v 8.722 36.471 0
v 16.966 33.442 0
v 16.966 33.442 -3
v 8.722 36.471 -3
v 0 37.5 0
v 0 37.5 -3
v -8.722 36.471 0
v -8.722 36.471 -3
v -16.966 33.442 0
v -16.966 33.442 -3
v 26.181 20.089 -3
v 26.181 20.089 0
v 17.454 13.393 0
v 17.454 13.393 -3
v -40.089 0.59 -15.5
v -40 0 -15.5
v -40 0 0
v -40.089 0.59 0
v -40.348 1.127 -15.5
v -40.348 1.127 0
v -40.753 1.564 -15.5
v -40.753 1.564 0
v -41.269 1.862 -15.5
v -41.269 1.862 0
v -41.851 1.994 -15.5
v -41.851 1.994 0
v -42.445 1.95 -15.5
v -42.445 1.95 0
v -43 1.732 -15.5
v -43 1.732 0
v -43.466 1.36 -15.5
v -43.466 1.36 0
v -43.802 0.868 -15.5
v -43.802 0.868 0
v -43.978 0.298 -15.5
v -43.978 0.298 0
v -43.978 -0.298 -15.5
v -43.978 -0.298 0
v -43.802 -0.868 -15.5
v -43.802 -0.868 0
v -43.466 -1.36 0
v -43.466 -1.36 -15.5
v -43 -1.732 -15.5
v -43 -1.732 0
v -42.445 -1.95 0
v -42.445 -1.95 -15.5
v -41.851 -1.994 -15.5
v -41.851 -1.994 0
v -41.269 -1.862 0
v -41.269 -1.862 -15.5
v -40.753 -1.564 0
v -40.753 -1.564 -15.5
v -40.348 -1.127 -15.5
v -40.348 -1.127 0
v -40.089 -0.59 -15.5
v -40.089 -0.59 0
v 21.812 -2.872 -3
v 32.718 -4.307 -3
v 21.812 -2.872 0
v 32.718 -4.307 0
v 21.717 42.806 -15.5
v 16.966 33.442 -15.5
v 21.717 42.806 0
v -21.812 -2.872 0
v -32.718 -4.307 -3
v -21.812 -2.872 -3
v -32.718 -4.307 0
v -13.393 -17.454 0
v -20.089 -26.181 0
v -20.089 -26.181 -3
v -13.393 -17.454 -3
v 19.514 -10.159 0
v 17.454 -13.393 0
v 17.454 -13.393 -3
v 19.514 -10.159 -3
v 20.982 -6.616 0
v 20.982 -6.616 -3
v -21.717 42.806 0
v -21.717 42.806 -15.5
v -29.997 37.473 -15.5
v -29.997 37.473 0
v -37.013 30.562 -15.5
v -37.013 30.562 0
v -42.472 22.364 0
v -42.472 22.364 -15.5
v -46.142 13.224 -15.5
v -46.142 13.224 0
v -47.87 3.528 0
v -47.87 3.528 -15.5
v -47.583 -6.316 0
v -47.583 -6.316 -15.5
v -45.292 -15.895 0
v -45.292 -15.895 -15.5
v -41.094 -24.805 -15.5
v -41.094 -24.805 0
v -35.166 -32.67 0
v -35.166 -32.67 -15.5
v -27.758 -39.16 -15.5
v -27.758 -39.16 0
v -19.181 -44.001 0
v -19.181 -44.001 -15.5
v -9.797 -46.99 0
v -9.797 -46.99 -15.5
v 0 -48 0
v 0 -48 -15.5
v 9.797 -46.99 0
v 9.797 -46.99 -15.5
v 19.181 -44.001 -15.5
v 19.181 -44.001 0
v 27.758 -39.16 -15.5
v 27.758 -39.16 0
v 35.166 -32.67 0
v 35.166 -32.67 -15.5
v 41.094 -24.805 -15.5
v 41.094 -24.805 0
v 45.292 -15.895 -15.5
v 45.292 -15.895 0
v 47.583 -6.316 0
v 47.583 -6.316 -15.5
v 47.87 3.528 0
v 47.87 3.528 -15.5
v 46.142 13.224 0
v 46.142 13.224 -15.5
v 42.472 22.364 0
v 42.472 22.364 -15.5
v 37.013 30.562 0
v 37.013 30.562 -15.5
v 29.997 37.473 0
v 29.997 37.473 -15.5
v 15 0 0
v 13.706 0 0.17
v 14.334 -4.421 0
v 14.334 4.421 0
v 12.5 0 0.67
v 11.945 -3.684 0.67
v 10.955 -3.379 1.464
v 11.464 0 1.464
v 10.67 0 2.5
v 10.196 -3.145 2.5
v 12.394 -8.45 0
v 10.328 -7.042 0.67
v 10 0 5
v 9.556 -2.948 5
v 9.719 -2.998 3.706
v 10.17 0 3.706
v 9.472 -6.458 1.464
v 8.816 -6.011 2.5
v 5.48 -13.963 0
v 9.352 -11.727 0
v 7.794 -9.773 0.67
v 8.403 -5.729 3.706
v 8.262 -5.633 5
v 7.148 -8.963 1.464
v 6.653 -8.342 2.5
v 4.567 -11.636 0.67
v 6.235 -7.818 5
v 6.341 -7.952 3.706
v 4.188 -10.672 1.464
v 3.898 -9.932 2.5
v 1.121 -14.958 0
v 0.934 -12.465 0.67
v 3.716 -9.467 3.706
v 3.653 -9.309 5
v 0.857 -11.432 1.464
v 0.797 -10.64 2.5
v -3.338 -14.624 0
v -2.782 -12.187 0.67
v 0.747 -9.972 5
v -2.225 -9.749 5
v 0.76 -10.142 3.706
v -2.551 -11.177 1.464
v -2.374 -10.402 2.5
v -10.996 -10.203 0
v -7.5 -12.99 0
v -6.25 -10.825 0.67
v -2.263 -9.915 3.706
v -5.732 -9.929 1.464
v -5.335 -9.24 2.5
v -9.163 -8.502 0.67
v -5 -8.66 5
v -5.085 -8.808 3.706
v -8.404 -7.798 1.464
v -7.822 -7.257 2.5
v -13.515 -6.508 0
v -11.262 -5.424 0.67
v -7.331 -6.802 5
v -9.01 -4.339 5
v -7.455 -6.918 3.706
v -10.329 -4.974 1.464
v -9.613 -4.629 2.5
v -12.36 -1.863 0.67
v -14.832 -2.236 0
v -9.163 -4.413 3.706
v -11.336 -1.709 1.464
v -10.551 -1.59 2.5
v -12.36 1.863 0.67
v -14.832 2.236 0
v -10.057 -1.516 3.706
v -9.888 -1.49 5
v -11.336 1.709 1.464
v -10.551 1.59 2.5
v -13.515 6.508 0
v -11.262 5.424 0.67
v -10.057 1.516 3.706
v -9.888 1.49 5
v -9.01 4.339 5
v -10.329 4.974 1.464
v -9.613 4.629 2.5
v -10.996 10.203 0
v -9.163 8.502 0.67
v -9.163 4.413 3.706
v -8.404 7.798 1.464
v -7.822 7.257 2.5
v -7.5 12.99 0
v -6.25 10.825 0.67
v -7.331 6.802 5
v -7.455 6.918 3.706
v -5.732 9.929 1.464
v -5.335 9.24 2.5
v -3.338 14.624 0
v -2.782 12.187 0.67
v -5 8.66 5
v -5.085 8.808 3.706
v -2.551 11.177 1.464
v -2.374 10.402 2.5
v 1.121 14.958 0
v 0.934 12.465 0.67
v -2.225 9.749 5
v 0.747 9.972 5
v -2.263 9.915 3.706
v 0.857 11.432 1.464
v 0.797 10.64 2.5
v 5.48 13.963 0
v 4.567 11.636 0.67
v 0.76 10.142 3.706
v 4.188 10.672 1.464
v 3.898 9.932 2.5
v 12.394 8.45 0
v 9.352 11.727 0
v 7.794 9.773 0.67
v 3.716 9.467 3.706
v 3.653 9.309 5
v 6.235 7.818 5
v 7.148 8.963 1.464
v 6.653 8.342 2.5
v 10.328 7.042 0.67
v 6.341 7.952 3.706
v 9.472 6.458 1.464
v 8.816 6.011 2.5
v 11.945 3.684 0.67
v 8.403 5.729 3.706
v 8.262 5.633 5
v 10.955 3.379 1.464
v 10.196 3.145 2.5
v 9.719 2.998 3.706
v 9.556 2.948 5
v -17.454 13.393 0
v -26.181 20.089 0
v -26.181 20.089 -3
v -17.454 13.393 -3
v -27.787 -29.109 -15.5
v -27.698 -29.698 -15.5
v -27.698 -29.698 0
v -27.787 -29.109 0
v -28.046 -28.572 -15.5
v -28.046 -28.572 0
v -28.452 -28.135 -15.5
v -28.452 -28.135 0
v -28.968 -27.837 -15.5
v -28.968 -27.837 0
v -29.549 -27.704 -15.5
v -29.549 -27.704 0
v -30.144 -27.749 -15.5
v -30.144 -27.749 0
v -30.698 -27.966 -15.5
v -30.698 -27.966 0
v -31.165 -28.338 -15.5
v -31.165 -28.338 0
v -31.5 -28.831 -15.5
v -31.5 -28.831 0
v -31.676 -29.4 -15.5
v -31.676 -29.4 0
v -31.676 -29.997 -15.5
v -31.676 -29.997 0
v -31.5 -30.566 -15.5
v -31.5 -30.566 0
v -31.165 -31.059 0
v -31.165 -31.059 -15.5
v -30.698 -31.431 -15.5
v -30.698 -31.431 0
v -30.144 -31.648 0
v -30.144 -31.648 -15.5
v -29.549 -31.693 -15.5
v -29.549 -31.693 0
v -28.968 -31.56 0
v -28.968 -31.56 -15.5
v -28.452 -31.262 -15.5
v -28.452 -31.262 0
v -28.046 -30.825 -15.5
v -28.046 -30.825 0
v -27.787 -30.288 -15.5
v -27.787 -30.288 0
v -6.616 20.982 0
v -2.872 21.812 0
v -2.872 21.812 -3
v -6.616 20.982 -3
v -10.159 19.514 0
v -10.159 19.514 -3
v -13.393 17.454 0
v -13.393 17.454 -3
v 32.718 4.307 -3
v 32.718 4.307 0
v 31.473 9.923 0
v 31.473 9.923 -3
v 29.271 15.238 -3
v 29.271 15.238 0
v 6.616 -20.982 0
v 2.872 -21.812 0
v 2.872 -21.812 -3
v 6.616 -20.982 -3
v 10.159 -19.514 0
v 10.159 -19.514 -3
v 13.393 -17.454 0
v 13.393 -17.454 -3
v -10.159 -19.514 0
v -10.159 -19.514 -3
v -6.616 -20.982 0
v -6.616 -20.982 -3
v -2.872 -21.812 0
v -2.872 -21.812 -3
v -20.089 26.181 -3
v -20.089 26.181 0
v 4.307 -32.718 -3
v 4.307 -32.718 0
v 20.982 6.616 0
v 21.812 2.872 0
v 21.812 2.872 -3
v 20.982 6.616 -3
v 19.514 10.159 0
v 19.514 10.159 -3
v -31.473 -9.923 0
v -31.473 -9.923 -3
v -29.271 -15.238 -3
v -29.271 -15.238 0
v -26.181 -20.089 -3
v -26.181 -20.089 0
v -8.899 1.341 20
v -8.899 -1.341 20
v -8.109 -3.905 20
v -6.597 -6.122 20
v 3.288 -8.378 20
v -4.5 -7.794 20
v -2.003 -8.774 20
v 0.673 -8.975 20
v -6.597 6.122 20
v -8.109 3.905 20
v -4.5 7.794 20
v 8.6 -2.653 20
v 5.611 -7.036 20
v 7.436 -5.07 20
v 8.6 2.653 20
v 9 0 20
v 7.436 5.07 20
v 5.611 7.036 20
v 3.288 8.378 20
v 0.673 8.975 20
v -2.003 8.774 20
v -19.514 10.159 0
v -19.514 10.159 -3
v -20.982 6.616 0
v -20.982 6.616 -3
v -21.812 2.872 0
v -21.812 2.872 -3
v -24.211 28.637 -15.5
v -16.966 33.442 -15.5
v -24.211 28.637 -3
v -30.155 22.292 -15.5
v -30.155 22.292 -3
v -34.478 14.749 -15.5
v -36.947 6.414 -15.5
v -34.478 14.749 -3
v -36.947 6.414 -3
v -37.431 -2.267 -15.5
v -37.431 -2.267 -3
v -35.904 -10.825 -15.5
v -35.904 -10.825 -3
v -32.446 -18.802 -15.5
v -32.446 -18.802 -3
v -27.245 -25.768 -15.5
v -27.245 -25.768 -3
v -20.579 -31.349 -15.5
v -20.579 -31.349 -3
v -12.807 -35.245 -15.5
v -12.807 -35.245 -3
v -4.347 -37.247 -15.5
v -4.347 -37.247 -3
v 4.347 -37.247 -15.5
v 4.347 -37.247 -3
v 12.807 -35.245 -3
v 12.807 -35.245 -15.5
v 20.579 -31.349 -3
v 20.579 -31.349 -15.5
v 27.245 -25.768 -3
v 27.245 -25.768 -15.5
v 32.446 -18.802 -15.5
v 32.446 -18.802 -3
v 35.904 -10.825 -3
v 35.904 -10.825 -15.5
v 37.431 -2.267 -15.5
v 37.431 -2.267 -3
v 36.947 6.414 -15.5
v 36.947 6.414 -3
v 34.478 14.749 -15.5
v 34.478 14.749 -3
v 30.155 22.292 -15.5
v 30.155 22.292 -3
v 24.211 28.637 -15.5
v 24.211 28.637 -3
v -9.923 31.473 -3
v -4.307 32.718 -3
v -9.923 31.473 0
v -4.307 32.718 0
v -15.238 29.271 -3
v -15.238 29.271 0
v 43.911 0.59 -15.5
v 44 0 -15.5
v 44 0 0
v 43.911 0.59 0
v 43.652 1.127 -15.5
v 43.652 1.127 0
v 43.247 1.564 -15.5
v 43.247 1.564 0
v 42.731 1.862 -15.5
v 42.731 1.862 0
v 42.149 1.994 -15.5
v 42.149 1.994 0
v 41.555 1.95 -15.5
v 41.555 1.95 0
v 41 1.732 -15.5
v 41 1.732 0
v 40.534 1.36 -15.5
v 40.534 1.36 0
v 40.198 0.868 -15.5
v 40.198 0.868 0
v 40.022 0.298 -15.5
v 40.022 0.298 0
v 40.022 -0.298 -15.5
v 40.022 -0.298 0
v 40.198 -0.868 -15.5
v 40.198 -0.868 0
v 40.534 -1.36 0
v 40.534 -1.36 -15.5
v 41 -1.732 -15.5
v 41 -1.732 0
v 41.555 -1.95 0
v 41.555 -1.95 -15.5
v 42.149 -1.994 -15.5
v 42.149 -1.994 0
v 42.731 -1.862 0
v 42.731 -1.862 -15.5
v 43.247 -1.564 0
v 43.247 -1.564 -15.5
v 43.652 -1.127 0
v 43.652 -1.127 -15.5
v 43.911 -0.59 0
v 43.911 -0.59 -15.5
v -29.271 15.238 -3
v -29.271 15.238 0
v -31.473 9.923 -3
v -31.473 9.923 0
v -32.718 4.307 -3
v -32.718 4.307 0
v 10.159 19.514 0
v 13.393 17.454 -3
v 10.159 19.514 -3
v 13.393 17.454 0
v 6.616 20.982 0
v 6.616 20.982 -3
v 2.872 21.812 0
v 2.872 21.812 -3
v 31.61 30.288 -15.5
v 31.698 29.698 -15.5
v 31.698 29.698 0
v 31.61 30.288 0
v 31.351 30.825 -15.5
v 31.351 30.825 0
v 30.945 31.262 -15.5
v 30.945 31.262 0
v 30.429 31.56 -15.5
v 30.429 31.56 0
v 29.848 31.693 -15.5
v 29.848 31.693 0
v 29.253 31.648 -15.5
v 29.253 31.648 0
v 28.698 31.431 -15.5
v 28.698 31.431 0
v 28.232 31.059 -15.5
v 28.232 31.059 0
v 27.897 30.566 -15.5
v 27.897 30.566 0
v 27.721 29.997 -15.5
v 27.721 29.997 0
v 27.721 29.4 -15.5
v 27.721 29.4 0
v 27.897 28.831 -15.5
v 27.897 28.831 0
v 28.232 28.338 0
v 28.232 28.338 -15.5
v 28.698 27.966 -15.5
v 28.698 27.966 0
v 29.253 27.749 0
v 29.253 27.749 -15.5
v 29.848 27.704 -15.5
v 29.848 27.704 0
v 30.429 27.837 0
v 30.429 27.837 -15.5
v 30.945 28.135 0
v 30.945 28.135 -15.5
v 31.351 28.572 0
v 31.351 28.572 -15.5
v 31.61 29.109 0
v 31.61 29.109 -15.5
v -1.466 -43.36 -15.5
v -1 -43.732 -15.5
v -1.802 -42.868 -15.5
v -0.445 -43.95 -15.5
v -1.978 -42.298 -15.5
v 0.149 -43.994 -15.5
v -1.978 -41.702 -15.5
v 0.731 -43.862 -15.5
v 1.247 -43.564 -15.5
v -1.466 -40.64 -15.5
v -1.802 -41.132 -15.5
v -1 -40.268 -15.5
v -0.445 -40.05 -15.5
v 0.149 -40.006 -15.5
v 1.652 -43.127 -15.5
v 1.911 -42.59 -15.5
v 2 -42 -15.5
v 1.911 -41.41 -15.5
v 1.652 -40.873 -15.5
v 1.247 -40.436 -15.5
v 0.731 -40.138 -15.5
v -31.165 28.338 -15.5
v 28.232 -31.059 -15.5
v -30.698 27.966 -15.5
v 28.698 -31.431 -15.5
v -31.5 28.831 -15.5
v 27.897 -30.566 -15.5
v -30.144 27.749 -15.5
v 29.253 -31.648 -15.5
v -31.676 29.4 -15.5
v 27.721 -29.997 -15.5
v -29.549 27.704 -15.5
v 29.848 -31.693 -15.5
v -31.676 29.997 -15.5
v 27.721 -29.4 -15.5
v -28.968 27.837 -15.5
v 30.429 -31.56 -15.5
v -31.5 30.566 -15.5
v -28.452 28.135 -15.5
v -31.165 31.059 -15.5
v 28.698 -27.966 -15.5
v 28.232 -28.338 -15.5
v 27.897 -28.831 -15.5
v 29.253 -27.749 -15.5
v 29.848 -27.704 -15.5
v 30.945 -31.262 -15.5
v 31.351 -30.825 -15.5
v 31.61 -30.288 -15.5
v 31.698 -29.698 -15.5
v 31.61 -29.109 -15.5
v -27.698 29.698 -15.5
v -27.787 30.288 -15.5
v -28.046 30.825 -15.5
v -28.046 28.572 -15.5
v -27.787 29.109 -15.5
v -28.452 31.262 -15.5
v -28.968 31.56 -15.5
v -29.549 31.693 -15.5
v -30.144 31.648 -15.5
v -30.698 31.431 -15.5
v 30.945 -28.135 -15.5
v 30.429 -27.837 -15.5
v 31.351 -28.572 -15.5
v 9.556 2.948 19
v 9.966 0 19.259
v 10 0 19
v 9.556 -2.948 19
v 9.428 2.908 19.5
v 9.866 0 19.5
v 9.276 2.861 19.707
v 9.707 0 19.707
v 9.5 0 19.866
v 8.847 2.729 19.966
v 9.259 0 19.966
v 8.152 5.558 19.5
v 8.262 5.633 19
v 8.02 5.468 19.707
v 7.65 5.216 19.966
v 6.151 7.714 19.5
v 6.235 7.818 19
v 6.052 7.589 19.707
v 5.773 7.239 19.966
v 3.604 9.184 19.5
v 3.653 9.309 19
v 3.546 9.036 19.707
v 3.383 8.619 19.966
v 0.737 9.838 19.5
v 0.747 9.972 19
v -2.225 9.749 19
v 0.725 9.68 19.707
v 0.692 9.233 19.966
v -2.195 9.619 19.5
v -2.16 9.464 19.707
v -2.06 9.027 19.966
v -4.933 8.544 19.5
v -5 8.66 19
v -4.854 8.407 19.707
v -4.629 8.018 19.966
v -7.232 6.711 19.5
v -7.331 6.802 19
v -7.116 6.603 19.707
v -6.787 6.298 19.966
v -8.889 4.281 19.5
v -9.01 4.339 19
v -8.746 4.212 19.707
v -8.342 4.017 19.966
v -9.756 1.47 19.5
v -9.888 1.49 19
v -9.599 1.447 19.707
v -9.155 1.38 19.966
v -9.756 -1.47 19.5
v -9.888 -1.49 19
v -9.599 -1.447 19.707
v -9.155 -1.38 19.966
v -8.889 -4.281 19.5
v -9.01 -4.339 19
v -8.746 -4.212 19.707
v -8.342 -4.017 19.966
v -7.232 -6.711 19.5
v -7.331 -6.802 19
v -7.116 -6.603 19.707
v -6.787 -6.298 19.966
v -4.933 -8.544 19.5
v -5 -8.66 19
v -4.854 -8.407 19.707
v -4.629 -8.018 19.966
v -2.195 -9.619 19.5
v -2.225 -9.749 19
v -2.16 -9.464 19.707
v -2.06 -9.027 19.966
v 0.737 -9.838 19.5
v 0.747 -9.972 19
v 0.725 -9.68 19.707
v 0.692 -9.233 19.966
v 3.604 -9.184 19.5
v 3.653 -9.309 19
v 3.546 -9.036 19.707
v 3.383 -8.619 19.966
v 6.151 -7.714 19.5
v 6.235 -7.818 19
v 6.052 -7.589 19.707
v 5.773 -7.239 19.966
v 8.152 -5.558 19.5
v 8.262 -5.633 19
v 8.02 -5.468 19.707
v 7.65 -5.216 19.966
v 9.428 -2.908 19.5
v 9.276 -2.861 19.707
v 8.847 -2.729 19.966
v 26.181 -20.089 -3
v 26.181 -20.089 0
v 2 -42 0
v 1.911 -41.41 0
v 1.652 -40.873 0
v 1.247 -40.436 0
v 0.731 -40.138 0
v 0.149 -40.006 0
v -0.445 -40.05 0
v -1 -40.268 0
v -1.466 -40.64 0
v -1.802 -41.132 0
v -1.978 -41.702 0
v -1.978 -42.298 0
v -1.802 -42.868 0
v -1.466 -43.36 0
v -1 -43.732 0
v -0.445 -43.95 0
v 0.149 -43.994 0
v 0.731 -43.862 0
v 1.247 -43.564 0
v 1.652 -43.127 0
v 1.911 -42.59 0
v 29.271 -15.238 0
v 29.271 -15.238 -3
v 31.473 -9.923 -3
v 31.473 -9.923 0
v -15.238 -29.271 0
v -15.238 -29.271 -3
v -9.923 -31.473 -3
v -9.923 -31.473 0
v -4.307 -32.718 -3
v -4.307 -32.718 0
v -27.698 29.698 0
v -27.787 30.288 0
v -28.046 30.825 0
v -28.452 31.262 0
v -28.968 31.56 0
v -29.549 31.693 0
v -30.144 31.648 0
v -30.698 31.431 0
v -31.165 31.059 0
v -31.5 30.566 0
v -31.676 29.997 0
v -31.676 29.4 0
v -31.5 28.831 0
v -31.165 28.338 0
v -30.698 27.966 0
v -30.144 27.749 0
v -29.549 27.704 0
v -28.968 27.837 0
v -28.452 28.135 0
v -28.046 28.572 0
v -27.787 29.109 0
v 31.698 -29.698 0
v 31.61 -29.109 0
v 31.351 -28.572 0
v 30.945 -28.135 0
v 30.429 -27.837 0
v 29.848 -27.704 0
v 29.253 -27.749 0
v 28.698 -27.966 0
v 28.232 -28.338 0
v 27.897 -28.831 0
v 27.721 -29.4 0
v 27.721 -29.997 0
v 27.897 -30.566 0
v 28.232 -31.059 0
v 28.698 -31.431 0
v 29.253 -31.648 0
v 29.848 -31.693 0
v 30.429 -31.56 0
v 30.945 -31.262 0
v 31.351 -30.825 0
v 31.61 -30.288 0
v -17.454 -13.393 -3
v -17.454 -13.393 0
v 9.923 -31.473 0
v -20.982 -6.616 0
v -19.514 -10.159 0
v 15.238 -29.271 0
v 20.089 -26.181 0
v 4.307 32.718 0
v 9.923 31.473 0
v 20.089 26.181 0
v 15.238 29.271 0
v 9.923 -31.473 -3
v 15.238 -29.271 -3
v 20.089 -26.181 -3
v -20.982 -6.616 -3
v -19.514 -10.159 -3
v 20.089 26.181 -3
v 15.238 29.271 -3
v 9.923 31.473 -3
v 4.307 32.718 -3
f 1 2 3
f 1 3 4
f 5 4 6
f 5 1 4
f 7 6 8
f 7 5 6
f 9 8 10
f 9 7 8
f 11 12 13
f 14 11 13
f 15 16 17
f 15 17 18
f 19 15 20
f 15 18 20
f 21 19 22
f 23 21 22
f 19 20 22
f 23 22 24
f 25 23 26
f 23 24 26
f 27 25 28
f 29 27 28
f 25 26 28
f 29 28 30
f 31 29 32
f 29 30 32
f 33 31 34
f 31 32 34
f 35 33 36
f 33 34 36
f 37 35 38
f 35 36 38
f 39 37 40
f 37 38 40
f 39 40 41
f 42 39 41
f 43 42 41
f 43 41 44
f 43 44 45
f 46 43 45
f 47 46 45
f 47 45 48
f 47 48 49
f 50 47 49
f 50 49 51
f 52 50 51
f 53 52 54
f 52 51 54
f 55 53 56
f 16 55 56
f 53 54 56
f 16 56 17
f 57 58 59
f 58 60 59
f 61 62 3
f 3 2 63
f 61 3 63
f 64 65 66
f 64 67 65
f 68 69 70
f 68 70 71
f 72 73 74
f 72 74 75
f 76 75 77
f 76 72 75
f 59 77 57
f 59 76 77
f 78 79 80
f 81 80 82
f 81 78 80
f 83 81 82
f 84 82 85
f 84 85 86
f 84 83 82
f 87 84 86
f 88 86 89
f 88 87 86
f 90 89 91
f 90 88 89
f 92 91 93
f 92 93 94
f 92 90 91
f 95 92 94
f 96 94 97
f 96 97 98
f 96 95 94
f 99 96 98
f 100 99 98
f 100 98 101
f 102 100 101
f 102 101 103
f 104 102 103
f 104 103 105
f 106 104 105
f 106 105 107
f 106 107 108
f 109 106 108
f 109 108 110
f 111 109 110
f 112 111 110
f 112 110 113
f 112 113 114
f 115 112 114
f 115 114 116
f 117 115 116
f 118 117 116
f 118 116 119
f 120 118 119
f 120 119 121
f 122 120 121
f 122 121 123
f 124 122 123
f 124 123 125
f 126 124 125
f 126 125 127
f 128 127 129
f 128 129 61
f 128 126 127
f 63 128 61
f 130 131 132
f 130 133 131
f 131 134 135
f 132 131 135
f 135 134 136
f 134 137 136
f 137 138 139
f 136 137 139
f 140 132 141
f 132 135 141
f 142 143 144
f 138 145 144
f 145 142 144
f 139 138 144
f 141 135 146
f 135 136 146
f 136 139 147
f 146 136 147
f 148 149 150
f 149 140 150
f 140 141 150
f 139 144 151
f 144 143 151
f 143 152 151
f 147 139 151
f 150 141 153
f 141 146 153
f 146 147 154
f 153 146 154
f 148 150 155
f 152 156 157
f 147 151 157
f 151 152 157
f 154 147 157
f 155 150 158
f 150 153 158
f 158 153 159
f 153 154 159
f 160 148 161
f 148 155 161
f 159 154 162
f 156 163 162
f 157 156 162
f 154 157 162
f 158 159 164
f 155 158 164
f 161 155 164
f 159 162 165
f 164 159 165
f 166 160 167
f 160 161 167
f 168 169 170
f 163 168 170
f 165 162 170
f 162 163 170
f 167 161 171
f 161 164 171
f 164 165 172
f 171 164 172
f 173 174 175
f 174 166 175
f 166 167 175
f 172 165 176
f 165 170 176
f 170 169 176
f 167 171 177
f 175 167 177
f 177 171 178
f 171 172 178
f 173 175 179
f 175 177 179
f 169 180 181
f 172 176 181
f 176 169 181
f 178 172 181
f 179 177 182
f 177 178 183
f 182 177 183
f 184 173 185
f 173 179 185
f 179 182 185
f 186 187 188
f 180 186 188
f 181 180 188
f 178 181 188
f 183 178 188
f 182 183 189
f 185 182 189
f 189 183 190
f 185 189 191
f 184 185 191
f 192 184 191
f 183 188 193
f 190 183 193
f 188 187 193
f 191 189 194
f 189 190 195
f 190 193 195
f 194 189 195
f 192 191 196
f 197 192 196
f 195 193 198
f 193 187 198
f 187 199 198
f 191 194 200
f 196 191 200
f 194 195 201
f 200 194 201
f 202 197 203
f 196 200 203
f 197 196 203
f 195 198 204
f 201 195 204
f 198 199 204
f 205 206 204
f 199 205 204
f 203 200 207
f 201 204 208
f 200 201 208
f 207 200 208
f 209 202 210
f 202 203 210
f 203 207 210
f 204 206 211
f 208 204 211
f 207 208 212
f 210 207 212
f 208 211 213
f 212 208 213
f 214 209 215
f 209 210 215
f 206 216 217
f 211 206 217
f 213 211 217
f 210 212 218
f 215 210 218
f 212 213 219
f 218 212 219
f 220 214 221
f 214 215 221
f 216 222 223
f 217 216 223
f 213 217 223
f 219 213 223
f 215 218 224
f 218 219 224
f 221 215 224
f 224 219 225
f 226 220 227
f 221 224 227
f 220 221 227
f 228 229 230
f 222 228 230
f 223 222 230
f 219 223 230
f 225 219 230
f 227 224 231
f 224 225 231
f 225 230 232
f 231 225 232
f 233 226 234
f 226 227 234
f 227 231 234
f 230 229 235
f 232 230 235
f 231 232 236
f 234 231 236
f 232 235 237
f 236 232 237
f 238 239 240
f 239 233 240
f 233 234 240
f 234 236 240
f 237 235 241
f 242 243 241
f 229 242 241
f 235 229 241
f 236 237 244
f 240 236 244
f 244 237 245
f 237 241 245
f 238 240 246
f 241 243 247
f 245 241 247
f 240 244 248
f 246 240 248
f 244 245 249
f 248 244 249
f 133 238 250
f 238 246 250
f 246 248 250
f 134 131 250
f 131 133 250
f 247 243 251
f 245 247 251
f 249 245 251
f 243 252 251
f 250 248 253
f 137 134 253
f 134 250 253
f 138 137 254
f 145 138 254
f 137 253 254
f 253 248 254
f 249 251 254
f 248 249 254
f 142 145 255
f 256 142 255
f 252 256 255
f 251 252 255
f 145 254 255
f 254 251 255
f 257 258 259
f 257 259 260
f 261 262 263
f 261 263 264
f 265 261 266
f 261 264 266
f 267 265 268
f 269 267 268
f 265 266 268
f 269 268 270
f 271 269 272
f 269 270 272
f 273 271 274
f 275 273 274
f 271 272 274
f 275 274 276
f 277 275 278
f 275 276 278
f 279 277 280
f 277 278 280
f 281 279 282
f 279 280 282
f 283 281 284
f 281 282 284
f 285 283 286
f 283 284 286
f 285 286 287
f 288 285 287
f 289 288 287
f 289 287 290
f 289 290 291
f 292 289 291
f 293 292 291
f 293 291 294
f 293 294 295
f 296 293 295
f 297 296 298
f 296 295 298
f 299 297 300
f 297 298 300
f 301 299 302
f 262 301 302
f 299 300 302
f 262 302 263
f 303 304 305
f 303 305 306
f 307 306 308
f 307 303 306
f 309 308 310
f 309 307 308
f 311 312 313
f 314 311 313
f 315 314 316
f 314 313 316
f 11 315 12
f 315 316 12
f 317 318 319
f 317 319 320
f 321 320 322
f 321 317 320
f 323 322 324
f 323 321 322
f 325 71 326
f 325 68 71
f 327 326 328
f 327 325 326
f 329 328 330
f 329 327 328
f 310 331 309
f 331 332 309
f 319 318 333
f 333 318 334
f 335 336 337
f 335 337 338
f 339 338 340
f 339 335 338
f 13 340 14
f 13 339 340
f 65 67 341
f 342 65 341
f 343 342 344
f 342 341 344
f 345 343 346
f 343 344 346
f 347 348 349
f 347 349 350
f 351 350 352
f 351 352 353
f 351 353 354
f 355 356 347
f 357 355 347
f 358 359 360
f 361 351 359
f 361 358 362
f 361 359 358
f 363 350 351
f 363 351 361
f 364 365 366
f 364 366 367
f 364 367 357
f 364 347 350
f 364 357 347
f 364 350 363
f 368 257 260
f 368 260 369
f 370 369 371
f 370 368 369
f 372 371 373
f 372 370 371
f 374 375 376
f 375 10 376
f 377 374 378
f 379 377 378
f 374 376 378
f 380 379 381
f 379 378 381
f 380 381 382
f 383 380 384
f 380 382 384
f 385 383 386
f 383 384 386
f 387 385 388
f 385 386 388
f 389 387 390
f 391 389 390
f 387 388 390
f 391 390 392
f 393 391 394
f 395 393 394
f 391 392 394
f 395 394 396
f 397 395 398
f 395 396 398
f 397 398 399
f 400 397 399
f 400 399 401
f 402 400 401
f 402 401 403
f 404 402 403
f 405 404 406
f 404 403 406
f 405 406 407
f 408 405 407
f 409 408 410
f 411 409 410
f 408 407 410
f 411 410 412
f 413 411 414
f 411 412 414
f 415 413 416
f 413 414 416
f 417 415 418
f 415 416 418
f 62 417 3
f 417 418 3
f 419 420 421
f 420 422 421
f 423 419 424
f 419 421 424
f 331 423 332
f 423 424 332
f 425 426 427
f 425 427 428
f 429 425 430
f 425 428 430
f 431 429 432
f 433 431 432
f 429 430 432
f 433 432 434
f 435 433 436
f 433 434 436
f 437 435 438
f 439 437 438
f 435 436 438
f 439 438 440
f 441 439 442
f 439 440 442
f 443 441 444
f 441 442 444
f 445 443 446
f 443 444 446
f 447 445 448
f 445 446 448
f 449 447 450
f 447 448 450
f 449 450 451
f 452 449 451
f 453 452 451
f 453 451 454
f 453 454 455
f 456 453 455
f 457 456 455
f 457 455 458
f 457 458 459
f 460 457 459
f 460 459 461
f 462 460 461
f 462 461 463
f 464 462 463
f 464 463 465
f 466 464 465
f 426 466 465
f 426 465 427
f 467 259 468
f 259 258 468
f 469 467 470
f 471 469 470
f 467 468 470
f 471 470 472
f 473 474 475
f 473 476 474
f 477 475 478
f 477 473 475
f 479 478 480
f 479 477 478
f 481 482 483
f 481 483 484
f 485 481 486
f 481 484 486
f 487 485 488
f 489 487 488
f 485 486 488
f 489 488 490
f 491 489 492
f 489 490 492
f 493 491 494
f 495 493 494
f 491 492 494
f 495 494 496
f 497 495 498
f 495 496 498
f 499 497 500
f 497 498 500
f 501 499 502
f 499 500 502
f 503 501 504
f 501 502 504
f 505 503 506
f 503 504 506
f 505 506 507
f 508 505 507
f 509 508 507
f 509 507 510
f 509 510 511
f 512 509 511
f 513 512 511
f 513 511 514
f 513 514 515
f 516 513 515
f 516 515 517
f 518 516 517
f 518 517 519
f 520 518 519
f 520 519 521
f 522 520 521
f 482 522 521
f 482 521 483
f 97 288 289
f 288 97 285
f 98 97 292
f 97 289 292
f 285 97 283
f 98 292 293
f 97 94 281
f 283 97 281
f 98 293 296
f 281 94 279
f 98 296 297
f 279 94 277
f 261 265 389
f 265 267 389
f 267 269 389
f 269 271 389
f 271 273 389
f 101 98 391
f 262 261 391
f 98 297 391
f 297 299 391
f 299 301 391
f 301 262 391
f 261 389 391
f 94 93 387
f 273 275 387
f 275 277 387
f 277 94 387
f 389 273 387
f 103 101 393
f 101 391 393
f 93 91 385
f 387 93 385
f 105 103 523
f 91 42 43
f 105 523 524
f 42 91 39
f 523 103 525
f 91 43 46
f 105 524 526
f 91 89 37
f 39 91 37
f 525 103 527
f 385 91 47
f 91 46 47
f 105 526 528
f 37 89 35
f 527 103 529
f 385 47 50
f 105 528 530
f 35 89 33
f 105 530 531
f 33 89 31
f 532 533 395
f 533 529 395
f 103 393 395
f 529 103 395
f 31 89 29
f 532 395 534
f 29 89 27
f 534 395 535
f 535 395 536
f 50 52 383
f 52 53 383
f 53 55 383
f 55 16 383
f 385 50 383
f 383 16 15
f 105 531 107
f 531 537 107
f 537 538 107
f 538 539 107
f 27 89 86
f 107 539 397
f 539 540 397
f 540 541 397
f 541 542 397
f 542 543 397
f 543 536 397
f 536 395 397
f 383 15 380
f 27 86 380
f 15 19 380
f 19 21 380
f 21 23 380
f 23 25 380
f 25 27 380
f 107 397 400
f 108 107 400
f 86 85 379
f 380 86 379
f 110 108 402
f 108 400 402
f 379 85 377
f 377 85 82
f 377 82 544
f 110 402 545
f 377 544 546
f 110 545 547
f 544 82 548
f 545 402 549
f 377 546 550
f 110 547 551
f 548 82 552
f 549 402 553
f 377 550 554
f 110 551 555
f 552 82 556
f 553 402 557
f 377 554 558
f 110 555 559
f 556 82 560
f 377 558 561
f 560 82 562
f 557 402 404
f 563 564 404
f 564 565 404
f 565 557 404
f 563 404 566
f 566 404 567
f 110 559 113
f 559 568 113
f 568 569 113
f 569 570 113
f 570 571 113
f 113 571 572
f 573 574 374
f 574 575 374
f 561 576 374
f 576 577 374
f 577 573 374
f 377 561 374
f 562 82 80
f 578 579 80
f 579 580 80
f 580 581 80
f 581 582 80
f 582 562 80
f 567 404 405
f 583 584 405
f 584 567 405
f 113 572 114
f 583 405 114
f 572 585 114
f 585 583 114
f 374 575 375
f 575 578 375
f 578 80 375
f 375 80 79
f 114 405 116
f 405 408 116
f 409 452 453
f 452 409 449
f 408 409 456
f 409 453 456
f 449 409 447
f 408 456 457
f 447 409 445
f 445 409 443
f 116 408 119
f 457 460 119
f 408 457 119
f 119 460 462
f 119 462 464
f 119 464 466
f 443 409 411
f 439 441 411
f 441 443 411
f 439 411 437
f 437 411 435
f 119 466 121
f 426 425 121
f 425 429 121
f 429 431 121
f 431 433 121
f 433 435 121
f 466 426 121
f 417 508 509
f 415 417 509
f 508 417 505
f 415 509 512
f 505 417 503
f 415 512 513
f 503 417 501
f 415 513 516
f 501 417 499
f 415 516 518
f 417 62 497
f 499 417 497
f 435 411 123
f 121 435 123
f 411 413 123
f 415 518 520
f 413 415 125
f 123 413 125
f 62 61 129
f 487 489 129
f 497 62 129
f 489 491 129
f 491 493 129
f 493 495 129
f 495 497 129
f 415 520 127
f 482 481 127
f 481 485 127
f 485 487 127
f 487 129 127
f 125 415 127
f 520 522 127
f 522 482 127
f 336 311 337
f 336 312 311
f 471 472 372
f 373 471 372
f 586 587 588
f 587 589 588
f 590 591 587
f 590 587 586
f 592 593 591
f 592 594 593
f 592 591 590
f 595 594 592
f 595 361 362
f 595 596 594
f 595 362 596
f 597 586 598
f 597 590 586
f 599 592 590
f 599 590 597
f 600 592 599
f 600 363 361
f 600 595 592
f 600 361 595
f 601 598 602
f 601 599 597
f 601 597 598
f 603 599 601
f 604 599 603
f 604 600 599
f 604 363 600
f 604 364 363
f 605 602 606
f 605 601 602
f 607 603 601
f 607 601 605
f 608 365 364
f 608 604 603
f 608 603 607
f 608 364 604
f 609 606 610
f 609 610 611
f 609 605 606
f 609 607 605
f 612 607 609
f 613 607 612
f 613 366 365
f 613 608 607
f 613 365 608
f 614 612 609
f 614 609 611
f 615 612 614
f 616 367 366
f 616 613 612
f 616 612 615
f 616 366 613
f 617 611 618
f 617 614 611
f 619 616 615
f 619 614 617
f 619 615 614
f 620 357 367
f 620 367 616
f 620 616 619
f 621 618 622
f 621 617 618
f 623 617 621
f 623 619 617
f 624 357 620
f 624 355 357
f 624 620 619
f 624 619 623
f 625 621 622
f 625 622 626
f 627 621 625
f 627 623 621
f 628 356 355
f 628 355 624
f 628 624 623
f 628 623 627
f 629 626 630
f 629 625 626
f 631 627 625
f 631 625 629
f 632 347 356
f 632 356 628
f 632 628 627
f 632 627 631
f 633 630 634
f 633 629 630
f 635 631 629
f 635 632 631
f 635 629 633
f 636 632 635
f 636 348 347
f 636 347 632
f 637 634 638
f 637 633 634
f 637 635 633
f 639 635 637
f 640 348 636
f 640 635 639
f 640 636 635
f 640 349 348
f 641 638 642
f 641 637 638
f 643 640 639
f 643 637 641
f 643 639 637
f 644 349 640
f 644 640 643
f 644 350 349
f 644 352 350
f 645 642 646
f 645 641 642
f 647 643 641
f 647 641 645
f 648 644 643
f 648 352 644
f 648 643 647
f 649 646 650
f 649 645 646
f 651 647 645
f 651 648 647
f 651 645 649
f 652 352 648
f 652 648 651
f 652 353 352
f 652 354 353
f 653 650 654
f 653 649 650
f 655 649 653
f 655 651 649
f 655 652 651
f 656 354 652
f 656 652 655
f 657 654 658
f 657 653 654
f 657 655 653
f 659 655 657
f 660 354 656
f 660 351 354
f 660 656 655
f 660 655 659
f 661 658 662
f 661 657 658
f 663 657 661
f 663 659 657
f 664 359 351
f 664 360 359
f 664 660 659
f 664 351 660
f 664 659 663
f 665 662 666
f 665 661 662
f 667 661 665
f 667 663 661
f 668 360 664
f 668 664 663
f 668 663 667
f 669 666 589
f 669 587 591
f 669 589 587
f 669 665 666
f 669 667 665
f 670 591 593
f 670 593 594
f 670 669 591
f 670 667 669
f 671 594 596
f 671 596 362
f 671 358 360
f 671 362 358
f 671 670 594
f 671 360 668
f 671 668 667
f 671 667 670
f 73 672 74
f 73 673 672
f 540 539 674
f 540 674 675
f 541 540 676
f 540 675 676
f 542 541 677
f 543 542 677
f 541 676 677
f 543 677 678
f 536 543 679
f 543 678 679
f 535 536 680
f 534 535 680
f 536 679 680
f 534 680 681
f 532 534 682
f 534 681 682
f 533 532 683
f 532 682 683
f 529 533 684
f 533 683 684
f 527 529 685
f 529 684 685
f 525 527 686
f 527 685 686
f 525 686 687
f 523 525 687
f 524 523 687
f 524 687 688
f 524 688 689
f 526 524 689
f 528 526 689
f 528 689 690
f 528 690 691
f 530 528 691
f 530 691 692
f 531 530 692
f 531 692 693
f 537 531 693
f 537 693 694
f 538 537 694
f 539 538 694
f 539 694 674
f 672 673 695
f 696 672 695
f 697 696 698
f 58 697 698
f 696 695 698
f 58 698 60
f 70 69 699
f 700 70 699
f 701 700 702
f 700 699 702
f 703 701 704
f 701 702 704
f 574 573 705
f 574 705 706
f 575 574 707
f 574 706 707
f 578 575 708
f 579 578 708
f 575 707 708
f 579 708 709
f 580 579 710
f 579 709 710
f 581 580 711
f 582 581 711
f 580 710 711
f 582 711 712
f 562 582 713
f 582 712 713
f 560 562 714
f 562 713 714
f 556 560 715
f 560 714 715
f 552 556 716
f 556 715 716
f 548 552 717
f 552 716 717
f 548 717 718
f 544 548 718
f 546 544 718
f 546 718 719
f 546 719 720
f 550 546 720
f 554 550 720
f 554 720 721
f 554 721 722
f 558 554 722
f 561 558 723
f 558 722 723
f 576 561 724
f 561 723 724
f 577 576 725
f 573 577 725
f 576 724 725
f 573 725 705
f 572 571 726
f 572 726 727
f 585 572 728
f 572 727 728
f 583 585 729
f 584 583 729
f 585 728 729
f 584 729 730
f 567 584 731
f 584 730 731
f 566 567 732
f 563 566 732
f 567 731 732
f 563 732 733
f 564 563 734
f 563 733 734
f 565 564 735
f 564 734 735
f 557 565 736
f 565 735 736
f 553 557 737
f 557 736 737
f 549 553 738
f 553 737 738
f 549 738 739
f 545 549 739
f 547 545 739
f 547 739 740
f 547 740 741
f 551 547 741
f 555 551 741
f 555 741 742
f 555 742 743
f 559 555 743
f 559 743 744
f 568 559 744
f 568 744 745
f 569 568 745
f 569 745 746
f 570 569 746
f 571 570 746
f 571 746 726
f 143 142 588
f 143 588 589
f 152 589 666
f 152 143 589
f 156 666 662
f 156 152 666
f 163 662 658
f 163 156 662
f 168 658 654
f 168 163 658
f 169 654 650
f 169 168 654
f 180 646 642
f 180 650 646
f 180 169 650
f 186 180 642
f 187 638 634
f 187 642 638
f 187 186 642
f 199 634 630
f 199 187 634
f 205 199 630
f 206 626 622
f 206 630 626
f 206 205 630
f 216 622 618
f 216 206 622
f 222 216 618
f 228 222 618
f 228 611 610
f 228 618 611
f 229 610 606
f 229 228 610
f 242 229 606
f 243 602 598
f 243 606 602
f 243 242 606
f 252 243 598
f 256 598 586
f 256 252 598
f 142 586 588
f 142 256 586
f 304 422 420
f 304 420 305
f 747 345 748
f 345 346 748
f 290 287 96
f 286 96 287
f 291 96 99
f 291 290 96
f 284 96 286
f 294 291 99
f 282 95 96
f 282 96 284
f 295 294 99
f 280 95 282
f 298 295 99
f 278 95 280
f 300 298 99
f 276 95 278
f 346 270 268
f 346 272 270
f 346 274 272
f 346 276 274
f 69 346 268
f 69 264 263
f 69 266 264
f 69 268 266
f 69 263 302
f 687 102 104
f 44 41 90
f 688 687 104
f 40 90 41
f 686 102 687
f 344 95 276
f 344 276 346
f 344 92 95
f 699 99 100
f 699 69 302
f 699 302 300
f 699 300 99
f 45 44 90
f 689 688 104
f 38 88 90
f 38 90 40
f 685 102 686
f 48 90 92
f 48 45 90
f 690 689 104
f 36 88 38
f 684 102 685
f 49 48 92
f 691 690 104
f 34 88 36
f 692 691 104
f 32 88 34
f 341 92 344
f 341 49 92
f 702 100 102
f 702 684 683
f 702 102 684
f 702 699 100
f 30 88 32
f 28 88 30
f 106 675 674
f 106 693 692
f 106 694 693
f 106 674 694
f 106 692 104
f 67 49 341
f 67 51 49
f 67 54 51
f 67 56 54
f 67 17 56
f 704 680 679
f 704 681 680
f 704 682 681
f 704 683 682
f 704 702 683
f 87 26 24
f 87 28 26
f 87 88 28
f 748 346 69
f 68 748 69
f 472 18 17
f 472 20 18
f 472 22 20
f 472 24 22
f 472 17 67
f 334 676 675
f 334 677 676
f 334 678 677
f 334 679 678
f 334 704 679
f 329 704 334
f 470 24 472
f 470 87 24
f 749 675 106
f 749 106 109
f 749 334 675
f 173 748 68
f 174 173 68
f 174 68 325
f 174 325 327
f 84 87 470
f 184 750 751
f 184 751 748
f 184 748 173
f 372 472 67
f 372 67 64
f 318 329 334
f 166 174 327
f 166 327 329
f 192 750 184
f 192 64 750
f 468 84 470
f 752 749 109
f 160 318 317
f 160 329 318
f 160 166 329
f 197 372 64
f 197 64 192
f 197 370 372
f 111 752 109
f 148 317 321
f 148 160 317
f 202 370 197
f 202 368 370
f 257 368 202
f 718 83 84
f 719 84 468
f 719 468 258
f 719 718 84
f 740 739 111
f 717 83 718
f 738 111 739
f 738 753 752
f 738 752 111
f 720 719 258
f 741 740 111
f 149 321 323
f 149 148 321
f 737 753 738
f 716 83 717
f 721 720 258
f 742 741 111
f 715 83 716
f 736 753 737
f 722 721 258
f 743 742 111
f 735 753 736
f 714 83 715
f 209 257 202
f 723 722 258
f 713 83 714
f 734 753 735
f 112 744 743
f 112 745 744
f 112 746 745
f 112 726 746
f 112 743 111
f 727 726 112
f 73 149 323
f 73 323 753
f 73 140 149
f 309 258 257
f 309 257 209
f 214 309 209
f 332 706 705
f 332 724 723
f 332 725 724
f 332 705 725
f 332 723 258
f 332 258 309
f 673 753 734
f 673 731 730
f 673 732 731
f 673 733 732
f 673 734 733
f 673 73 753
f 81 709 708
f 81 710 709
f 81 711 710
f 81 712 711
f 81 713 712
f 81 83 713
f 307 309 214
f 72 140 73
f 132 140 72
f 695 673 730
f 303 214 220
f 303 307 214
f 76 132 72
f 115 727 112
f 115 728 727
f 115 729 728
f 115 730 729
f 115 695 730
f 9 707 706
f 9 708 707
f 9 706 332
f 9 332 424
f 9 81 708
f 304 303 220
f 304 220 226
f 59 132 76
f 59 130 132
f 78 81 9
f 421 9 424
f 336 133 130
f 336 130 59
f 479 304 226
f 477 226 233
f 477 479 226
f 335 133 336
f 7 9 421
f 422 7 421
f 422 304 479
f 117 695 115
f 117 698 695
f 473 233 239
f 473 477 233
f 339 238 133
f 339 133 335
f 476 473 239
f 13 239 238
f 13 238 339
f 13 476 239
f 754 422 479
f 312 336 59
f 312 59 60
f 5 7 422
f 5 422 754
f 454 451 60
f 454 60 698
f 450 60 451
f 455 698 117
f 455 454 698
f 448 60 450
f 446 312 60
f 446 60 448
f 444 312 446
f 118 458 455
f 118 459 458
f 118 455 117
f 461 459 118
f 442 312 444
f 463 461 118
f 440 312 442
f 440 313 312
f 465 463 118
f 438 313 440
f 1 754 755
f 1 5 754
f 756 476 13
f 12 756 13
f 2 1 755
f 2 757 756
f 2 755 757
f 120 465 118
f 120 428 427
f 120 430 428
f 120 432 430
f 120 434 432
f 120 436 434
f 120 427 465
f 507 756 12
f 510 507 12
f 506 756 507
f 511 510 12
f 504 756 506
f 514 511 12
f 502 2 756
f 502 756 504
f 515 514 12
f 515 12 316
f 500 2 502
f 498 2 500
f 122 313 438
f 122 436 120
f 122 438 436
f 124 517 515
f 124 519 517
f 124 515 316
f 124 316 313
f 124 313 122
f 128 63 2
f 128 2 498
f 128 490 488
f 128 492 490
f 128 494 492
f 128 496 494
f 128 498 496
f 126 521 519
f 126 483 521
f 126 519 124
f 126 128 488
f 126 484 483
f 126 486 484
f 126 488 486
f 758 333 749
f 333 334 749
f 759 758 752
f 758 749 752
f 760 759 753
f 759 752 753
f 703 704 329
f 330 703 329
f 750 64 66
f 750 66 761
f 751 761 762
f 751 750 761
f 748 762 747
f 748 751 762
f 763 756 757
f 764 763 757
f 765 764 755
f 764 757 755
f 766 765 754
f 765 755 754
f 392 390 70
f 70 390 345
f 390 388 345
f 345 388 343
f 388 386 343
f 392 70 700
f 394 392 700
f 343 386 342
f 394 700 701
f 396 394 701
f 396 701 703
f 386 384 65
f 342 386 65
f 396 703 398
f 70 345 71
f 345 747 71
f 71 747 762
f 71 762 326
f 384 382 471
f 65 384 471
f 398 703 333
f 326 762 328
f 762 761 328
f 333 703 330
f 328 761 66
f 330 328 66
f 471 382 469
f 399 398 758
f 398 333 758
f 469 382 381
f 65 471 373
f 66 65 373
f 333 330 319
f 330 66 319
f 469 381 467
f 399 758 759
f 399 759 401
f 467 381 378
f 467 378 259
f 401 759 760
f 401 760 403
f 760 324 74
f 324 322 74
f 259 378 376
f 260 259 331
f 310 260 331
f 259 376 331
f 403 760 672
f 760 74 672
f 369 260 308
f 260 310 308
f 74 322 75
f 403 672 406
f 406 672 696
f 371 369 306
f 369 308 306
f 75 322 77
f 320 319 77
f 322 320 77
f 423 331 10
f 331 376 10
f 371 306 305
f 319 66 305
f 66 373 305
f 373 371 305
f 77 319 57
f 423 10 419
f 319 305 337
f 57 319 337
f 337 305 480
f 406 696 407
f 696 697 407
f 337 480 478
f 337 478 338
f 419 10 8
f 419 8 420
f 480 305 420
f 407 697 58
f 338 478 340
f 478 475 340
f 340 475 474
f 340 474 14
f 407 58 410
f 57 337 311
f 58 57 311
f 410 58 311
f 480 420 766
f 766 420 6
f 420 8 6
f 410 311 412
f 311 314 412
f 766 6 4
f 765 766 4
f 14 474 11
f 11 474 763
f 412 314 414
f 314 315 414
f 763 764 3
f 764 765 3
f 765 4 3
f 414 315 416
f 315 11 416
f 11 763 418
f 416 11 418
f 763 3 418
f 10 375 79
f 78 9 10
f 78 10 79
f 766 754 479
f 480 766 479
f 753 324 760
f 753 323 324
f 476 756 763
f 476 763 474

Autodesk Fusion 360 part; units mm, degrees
sketch "base" plane through (0, 0, 0) normal (0, 0, 1) x (1, 0, 0)
  circle A0 centre (0, 0) radius 48
  circle A1 centre (0, 0) radius 37.5
  line L0 (0, 0) -> (0, 48)
  line L1 (0, 0) -> (-21.7169, 42.8063)
  line L2 (0, 0) -> (21.7169, 42.8063)
  dimension "d1" = 96
  dimension "d2" = 75
  dimension "d3" = 26.9
extrude "Extrude1" add sketch "base" against normal blind 15.5 contours A0 A1 L1 L2
extrude "Extrude2" add sketch "base" against normal blind 3 contours A1 L0 L2 | A1 L1 L2 | A1 L0 L1
sketch "axis" plane through (0, 0, 0) normal (0, 0, 1) x (1, 0, 0)
  circle A0 centre (0, 0) radius 10
  dimension "d8" = 20
extrude "Extrude3" add sketch "axis" along normal blind 20
fillet "Fillet1" radius 5 1 edges at (-9.3233, 3.6162, 0)
fillet "Fillet2" radius 1 1 edges at (-9.3233, -3.6162, 20)
sketch "thermal gaps" plane through (0, 0, 0) normal (0, 0, 1) x (1, 0, 0)
  line L0 (0, 0) -> (0, -65)
  line L1 (0, 0) -> (4.3074, -32.7177)
  line L2 (0, 0) -> (2.8716, -21.8118)
  line L3 (0, 0) -> (13.3928, -17.4538)
  line L4 (0, 0) -> (20.0891, -26.1807)
  arc A0 (2.8716, -21.8118) -> (13.3928, -17.4538) centre (0, 0) ccw
  arc A1 (4.3074, -32.7177) -> (20.0891, -26.1807) centre (0, 0) ccw
  line L5 (20.0891, -26.1807) -> (13.3928, -17.4538)
  line L6 (4.3074, -32.7177) -> (2.8716, -21.8118)
  line L7 (32.7177, -4.3074) -> (21.8118, -2.8716)
  line L8 (26.1807, -20.0891) -> (17.4538, -13.3928)
  arc A2 (17.4538, -13.3928) -> (21.8118, -2.8716) centre (0, 0) ccw
  arc A3 (26.1807, -20.0891) -> (32.7177, -4.3074) centre (0, 0) ccw
  line L9 (26.1807, 20.0891) -> (17.4538, 13.3928)
  line L10 (32.7177, 4.3074) -> (21.8118, 2.8716)
  arc A4 (21.8118, 2.8716) -> (17.4538, 13.3928) centre (0, 0) ccw
  arc A5 (32.7177, 4.3074) -> (26.1807, 20.0891) centre (0, 0) ccw
  line L11 (4.3074, 32.7177) -> (2.8716, 21.8118)
  line L12 (20.0891, 26.1807) -> (13.3928, 17.4538)
  arc A6 (13.3928, 17.4538) -> (2.8716, 21.8118) centre (0, 0) ccw
  arc A7 (20.0891, 26.1807) -> (4.3074, 32.7177) centre (0, 0) ccw
  line L13 (-20.0891, 26.1807) -> (-13.3928, 17.4538)
  line L14 (-4.3074, 32.7177) -> (-2.8716, 21.8118)
  arc A8 (-2.8716, 21.8118) -> (-13.3928, 17.4538) centre (0, 0) ccw
  arc A9 (-4.3074, 32.7177) -> (-20.0891, 26.1807) centre (0, 0) ccw
  line L15 (-32.7177, 4.3074) -> (-21.8118, 2.8716)
  line L16 (-26.1807, 20.0891) -> (-17.4538, 13.3928)
  arc A10 (-17.4538, 13.3928) -> (-21.8118, 2.8716) centre (0, 0) ccw
  arc A11 (-26.1807, 20.0891) -> (-32.7177, 4.3074) centre (0, 0) ccw
  line L17 (-26.1807, -20.0891) -> (-17.4538, -13.3928)
  line L18 (-32.7177, -4.3074) -> (-21.8118, -2.8716)
  arc A12 (-21.8118, -2.8716) -> (-17.4538, -13.3928) centre (0, 0) ccw
  arc A13 (-32.7177, -4.3074) -> (-26.1807, -20.0891) centre (0, 0) ccw
  line L19 (-4.3074, -32.7177) -> (-2.8716, -21.8118)
  line L20 (-20.0891, -26.1807) -> (-13.3928, -17.4538)
  arc A14 (-13.3928, -17.4538) -> (-2.8716, -21.8118) centre (0, 0) ccw
  arc A15 (-20.0891, -26.1807) -> (-4.3074, -32.7177) centre (0, 0) ccw
  dimension "d15" = 33
  dimension "d16" = 7.5
  dimension "d17" = 22
  dimension "d18" = 22
  dimension "d19" = 33
  dimension "d20" = 30
  dimension "d22" = 360
extrude "Extrude4" cut sketch "thermal gaps" against normal blind 10 contours L1 L4 A0 A1 L5 L6 | L7 L8 A2 A3 | L9 L10 A4 A5 | L11 L12 A6 A7 | L13 L14 A8 A9 | L15 L16 A10 A11 | L17 L18 A12 A13 | L19 L20 A14 A15
sketch "Sketch5" plane through (0, 0, 0) normal (0, 0, 1) x (1, 0, 0)
  line L0 (0, 0) -> (0, 42)
  circle A0 centre (0, 42) radius 2
  circle A1 centre (-29.6985, 29.6985) radius 2
  circle A2 centre (-42, 0) radius 2
  circle A3 centre (-29.6985, -29.6985) radius 2
  circle A4 centre (0, -42) radius 2
  circle A5 centre (29.6985, -29.6985) radius 2
  circle A6 centre (42, 0) radius 2
  circle A7 centre (29.6985, 29.6985) radius 2
  dimension "d25" = 42
  dimension "d26" = 4
  dimension "d28" = 360
extrude "Extrude5" cut sketch "Sketch5" against normal blind 25 contours A1 | A2 | A3 | A4 | A5 | A6 | A7
equation "d3 = ( 53.8 / 2 ) * 1 deg"
